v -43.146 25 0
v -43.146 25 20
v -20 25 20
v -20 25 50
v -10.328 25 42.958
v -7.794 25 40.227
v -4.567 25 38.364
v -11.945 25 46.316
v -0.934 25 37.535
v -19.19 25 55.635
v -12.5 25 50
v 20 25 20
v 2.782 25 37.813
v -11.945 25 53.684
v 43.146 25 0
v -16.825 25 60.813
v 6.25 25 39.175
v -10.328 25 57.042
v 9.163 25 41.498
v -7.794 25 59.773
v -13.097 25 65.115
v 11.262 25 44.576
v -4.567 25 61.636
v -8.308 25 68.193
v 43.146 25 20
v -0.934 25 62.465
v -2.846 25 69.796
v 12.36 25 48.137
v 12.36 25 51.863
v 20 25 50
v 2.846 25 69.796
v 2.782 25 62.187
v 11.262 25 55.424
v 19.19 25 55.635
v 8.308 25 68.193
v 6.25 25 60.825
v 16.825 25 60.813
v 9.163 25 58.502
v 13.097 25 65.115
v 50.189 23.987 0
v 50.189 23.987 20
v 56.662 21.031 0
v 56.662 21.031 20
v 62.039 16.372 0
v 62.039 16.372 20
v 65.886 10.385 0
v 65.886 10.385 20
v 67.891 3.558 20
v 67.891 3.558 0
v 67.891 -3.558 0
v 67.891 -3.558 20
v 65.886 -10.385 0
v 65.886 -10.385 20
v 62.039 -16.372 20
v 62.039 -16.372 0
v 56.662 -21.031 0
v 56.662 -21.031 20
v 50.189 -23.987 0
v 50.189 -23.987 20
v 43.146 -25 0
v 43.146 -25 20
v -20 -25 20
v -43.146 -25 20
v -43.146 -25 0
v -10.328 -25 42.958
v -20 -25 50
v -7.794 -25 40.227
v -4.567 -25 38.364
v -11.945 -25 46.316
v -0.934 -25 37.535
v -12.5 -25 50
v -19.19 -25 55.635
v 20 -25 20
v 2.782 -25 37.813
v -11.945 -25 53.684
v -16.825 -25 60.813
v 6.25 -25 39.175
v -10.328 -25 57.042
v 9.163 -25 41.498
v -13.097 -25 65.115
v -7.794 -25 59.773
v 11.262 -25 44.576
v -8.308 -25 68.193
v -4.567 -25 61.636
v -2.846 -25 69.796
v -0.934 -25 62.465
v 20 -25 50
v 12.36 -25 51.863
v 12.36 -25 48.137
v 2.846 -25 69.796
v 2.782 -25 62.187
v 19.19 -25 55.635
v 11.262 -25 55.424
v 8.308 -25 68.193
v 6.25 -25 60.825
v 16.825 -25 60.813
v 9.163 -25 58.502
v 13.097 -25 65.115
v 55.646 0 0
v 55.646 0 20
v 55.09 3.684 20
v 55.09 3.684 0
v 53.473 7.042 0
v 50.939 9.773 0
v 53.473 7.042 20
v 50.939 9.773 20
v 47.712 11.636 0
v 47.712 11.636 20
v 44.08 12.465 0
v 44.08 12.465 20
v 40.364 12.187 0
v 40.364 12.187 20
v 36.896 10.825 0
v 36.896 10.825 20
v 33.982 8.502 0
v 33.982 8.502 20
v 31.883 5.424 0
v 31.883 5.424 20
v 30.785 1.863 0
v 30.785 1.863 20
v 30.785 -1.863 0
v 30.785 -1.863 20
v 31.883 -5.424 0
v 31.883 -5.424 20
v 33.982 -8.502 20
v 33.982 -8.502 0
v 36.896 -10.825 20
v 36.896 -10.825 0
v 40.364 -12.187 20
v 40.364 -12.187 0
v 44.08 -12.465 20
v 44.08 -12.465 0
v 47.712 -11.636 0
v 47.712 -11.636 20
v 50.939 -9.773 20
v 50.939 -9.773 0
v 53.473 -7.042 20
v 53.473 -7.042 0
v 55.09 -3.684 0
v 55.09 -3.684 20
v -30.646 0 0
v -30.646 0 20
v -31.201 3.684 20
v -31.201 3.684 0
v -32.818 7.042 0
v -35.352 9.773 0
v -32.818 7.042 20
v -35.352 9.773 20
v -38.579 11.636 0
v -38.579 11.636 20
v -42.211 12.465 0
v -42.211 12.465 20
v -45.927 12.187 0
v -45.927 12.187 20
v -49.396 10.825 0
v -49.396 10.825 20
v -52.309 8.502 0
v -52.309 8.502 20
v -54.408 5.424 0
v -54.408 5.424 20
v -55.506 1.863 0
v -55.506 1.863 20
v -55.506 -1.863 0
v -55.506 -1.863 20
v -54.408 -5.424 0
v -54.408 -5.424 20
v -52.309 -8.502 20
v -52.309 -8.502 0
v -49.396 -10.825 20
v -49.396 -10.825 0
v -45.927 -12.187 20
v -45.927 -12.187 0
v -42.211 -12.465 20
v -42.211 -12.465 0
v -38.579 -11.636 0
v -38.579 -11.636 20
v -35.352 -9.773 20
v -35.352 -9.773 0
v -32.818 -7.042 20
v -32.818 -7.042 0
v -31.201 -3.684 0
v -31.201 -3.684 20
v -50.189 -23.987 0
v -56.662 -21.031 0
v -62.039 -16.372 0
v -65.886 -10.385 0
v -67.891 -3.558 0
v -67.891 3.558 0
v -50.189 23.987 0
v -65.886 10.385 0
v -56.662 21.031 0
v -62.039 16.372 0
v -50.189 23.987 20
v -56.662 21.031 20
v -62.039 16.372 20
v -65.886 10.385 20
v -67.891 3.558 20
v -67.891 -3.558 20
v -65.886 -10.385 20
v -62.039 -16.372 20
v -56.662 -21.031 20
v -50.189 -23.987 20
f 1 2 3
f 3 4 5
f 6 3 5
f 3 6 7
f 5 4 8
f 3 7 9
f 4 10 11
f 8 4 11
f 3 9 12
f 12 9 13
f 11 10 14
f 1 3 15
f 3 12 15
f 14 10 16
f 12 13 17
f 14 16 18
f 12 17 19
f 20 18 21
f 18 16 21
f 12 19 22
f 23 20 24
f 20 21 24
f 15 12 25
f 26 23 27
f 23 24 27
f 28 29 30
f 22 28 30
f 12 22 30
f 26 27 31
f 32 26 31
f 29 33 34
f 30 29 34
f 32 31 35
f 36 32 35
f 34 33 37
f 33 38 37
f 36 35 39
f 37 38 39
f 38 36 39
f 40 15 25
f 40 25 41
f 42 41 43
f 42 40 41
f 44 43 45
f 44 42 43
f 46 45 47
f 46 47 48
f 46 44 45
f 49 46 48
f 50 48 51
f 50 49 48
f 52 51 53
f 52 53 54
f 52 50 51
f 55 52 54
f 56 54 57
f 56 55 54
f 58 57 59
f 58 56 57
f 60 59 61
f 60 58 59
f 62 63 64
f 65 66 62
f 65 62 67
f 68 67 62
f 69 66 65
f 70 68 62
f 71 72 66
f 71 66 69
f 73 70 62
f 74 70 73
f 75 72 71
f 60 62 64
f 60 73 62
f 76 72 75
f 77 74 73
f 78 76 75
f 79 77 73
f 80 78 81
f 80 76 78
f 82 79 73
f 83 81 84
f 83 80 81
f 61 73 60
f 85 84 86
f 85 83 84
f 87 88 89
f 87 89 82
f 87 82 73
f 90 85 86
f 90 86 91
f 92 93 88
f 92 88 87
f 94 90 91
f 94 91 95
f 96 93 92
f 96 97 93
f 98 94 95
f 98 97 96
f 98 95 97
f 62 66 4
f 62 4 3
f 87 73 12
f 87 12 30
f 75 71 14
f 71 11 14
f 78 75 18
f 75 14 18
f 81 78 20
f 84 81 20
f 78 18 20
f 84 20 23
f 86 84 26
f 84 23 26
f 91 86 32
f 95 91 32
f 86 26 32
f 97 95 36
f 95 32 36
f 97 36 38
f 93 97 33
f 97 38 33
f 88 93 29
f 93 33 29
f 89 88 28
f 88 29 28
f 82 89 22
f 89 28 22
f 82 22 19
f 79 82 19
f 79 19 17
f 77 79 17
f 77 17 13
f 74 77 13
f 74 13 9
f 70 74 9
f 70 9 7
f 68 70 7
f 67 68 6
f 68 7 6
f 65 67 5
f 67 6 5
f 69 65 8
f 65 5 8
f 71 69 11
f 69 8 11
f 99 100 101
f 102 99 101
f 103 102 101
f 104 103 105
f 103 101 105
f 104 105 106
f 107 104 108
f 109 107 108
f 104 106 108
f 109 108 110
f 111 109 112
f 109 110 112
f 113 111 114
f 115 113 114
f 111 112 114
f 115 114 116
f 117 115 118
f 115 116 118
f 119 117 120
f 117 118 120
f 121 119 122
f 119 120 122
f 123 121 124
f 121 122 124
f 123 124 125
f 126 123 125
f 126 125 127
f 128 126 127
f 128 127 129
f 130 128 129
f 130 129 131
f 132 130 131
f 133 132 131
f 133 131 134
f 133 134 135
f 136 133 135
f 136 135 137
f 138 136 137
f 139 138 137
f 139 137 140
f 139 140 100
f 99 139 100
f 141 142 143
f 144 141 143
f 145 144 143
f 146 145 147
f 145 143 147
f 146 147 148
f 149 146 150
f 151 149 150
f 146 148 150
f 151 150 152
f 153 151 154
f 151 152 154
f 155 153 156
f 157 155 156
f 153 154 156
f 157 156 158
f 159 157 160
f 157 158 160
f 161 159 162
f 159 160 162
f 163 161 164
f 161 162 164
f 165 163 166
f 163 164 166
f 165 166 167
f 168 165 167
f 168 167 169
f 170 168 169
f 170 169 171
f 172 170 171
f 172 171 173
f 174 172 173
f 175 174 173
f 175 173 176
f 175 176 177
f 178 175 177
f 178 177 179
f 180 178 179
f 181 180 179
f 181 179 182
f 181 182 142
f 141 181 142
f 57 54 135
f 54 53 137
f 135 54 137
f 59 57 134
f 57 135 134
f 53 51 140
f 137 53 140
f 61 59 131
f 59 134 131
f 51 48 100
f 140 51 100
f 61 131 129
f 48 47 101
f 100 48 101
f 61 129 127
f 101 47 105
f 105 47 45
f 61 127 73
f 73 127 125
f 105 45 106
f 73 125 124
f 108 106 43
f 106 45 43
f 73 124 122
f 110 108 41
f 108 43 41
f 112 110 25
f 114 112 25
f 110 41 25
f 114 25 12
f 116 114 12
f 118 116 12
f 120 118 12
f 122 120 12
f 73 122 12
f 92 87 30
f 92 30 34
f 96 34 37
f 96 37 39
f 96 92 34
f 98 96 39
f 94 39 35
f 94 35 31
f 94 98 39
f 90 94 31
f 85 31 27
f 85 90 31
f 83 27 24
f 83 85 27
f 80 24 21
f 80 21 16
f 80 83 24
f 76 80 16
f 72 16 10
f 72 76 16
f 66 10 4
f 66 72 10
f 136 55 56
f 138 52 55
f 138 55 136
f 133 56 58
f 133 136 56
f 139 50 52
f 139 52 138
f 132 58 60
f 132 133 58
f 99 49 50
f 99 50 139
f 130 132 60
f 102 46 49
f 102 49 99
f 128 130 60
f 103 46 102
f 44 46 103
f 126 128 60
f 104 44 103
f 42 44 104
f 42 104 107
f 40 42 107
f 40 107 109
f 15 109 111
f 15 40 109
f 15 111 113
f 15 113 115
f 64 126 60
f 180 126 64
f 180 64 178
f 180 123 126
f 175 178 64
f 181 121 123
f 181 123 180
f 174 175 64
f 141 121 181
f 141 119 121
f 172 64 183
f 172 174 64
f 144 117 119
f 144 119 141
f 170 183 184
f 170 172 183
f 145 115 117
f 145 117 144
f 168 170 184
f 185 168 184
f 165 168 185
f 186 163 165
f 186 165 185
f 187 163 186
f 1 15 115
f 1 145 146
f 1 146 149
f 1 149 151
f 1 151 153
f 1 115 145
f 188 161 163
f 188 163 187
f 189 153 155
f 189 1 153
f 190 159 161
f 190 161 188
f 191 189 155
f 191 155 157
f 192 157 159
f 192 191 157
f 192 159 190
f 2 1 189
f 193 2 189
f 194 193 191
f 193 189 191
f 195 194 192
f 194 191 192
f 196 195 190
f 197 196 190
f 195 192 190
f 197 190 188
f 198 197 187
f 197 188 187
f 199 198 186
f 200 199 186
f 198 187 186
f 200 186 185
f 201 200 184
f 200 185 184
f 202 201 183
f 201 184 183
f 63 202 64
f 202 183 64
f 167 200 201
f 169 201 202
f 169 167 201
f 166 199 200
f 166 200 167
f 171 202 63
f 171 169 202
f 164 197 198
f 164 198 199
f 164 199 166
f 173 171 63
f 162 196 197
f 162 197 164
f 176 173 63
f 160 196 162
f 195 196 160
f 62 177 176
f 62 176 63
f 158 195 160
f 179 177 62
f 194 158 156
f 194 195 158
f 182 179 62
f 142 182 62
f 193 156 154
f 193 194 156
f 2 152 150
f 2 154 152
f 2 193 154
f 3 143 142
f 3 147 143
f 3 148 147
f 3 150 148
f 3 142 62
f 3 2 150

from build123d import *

# Parameters (mm, degrees)
F2_DEPTH  = 25
F3_DEPTH  = 20
F6_DEPTH  = 50
F8_R      = 12.5
F9_DEPTH  = 54.4
F7_R      = 12.5
F10_DEPTH = 25


with BuildPart() as f2:
    # F0 (on Front) → F2 (new body, symmetric)
    with BuildSketch(Plane.XZ):
        Polygon((-43.145511, 0), (-20, 0), (20, 0), (43.145511, 0), (43.145511, 20), (20, 20), (20, 50), (-20, 50), (-20, 20), (-43.145511, 20), align=None)
    extrude(amount=F2_DEPTH, both=True)

    # F1 (on Top) → F3 (join)
    with BuildSketch(Plane.XY):
        with BuildLine():
            Line((-43.145511, -25), (-43.145511, 25))
            ThreePointArc((-43.145511, 25), (-68.145511, 0), (-43.145511, -25))
        make_face()
    extrude(amount=F3_DEPTH)

    # F4: F2 across plane


with BuildPart() as f2_1:
    add(f2.part)
    add(f2.part.mirror(Plane.YZ))

    # F5 (on face) → F6 (join)
    with BuildSketch(Plane.XZ.offset(25)):
        with BuildLine():
            Line((-20, 50), (20, 50))
            ThreePointArc((20, 50), (0, 70), (-20, 50))
        make_face()
    extrude(amount=-F6_DEPTH)

    # F8 (on face) → F9 (cut, symmetric)
    with BuildSketch(Plane(origin=(0, 25, 0), x_dir=(-1, 0, 0), z_dir=(0, 1, 0))):
        with Locations((0, 50)):
            Circle(F8_R)
    extrude(amount=F9_DEPTH, both=True, mode=Mode.SUBTRACT)

    # F7 (on face) → F10 (cut)
    with BuildSketch(Plane.XY.offset(20)):
        with Locations((43.145511, 0)):
            Circle(F7_R)
        with Locations((-43.145511, 0)):
            Circle(F7_R)
    extrude(amount=-F10_DEPTH, mode=Mode.SUBTRACT)


solid = f2_1.part
